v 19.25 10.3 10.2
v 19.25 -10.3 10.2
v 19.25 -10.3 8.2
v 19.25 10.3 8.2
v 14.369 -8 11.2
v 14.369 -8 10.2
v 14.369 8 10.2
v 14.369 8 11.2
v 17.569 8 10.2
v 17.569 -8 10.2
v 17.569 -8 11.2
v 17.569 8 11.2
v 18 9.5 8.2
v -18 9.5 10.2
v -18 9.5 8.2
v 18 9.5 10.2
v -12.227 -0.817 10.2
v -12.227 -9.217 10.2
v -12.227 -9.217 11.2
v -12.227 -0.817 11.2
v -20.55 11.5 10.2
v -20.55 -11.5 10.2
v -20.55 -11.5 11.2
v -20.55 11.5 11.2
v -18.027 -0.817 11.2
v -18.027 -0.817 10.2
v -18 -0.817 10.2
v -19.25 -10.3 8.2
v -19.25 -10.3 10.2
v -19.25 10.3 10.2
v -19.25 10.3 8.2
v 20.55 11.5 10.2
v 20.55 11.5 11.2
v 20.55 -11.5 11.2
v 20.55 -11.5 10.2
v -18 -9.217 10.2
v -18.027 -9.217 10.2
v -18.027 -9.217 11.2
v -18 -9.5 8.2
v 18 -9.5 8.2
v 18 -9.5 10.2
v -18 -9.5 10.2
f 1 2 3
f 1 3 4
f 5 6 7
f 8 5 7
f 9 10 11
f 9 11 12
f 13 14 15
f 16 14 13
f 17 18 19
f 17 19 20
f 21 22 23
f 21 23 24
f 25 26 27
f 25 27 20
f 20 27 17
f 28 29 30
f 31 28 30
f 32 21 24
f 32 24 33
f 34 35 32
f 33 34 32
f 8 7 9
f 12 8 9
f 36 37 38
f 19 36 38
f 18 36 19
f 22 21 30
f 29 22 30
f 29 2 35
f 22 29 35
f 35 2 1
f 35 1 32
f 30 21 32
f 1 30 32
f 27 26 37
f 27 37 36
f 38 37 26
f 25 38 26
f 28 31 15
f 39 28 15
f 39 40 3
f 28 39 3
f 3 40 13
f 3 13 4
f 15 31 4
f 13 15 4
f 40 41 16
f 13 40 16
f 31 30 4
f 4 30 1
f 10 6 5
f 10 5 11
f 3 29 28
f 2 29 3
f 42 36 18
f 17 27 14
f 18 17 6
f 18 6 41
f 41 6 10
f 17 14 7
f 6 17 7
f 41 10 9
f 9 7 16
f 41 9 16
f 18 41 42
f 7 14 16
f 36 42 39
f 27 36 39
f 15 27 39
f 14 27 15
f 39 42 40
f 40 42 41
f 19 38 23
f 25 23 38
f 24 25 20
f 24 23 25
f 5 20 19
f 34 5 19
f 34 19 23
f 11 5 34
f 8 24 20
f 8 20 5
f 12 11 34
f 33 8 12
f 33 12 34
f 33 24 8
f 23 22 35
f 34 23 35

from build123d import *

# Parameters (mm, degrees)
SKETCH003_W     = 41.1
SKETCH003_H     = 23
PAD001_DEPTH    = 1
SKETCH004_W     = 38.5
SKETCH004_H     = 20.6
PAD002_DEPTH    = 2
SKETCH005_W     = 36
SKETCH005_H     = 19
POCKET002_DEPTH = 2.001
SKETCH006_W     = 3.2
SKETCH006_H     = 16
SKETCH006_W_2   = 5.8
SKETCH006_H_2   = 8.4
POCKET003_DEPTH = 1.001


with BuildPart() as part:
    # Sketch003 (on DatumPlane) → Pad001 (new body)
    with BuildSketch(Plane.XY.offset(10.2)):
        Rectangle(SKETCH003_W, SKETCH003_H)
    extrude(amount=PAD001_DEPTH)

    # Sketch004 (on DatumPlane) → Pad002 (join)
    with BuildSketch(Plane.XY.offset(10.2)):
        Rectangle(SKETCH004_W, SKETCH004_H)
    extrude(amount=-PAD002_DEPTH)

    # Sketch005 (on DatumPlane) → Pocket002 (cut, through all)
    with BuildSketch(Plane.XY.offset(10.2)):
        Rectangle(SKETCH005_W, SKETCH005_H)
    extrude(amount=-POCKET002_DEPTH, mode=Mode.SUBTRACT)

    # Sketch006 (on DatumPlane) → Pocket003 (cut, through all)
    with BuildSketch(Plane.XY.offset(10.2)):
        with Locations((15.968977, 0)):
            Rectangle(SKETCH006_W, SKETCH006_H)
        with Locations((-15.127274, -5.017358)):
            Rectangle(SKETCH006_W_2, SKETCH006_H_2)
    extrude(amount=POCKET003_DEPTH, mode=Mode.SUBTRACT)


solid = part.part
